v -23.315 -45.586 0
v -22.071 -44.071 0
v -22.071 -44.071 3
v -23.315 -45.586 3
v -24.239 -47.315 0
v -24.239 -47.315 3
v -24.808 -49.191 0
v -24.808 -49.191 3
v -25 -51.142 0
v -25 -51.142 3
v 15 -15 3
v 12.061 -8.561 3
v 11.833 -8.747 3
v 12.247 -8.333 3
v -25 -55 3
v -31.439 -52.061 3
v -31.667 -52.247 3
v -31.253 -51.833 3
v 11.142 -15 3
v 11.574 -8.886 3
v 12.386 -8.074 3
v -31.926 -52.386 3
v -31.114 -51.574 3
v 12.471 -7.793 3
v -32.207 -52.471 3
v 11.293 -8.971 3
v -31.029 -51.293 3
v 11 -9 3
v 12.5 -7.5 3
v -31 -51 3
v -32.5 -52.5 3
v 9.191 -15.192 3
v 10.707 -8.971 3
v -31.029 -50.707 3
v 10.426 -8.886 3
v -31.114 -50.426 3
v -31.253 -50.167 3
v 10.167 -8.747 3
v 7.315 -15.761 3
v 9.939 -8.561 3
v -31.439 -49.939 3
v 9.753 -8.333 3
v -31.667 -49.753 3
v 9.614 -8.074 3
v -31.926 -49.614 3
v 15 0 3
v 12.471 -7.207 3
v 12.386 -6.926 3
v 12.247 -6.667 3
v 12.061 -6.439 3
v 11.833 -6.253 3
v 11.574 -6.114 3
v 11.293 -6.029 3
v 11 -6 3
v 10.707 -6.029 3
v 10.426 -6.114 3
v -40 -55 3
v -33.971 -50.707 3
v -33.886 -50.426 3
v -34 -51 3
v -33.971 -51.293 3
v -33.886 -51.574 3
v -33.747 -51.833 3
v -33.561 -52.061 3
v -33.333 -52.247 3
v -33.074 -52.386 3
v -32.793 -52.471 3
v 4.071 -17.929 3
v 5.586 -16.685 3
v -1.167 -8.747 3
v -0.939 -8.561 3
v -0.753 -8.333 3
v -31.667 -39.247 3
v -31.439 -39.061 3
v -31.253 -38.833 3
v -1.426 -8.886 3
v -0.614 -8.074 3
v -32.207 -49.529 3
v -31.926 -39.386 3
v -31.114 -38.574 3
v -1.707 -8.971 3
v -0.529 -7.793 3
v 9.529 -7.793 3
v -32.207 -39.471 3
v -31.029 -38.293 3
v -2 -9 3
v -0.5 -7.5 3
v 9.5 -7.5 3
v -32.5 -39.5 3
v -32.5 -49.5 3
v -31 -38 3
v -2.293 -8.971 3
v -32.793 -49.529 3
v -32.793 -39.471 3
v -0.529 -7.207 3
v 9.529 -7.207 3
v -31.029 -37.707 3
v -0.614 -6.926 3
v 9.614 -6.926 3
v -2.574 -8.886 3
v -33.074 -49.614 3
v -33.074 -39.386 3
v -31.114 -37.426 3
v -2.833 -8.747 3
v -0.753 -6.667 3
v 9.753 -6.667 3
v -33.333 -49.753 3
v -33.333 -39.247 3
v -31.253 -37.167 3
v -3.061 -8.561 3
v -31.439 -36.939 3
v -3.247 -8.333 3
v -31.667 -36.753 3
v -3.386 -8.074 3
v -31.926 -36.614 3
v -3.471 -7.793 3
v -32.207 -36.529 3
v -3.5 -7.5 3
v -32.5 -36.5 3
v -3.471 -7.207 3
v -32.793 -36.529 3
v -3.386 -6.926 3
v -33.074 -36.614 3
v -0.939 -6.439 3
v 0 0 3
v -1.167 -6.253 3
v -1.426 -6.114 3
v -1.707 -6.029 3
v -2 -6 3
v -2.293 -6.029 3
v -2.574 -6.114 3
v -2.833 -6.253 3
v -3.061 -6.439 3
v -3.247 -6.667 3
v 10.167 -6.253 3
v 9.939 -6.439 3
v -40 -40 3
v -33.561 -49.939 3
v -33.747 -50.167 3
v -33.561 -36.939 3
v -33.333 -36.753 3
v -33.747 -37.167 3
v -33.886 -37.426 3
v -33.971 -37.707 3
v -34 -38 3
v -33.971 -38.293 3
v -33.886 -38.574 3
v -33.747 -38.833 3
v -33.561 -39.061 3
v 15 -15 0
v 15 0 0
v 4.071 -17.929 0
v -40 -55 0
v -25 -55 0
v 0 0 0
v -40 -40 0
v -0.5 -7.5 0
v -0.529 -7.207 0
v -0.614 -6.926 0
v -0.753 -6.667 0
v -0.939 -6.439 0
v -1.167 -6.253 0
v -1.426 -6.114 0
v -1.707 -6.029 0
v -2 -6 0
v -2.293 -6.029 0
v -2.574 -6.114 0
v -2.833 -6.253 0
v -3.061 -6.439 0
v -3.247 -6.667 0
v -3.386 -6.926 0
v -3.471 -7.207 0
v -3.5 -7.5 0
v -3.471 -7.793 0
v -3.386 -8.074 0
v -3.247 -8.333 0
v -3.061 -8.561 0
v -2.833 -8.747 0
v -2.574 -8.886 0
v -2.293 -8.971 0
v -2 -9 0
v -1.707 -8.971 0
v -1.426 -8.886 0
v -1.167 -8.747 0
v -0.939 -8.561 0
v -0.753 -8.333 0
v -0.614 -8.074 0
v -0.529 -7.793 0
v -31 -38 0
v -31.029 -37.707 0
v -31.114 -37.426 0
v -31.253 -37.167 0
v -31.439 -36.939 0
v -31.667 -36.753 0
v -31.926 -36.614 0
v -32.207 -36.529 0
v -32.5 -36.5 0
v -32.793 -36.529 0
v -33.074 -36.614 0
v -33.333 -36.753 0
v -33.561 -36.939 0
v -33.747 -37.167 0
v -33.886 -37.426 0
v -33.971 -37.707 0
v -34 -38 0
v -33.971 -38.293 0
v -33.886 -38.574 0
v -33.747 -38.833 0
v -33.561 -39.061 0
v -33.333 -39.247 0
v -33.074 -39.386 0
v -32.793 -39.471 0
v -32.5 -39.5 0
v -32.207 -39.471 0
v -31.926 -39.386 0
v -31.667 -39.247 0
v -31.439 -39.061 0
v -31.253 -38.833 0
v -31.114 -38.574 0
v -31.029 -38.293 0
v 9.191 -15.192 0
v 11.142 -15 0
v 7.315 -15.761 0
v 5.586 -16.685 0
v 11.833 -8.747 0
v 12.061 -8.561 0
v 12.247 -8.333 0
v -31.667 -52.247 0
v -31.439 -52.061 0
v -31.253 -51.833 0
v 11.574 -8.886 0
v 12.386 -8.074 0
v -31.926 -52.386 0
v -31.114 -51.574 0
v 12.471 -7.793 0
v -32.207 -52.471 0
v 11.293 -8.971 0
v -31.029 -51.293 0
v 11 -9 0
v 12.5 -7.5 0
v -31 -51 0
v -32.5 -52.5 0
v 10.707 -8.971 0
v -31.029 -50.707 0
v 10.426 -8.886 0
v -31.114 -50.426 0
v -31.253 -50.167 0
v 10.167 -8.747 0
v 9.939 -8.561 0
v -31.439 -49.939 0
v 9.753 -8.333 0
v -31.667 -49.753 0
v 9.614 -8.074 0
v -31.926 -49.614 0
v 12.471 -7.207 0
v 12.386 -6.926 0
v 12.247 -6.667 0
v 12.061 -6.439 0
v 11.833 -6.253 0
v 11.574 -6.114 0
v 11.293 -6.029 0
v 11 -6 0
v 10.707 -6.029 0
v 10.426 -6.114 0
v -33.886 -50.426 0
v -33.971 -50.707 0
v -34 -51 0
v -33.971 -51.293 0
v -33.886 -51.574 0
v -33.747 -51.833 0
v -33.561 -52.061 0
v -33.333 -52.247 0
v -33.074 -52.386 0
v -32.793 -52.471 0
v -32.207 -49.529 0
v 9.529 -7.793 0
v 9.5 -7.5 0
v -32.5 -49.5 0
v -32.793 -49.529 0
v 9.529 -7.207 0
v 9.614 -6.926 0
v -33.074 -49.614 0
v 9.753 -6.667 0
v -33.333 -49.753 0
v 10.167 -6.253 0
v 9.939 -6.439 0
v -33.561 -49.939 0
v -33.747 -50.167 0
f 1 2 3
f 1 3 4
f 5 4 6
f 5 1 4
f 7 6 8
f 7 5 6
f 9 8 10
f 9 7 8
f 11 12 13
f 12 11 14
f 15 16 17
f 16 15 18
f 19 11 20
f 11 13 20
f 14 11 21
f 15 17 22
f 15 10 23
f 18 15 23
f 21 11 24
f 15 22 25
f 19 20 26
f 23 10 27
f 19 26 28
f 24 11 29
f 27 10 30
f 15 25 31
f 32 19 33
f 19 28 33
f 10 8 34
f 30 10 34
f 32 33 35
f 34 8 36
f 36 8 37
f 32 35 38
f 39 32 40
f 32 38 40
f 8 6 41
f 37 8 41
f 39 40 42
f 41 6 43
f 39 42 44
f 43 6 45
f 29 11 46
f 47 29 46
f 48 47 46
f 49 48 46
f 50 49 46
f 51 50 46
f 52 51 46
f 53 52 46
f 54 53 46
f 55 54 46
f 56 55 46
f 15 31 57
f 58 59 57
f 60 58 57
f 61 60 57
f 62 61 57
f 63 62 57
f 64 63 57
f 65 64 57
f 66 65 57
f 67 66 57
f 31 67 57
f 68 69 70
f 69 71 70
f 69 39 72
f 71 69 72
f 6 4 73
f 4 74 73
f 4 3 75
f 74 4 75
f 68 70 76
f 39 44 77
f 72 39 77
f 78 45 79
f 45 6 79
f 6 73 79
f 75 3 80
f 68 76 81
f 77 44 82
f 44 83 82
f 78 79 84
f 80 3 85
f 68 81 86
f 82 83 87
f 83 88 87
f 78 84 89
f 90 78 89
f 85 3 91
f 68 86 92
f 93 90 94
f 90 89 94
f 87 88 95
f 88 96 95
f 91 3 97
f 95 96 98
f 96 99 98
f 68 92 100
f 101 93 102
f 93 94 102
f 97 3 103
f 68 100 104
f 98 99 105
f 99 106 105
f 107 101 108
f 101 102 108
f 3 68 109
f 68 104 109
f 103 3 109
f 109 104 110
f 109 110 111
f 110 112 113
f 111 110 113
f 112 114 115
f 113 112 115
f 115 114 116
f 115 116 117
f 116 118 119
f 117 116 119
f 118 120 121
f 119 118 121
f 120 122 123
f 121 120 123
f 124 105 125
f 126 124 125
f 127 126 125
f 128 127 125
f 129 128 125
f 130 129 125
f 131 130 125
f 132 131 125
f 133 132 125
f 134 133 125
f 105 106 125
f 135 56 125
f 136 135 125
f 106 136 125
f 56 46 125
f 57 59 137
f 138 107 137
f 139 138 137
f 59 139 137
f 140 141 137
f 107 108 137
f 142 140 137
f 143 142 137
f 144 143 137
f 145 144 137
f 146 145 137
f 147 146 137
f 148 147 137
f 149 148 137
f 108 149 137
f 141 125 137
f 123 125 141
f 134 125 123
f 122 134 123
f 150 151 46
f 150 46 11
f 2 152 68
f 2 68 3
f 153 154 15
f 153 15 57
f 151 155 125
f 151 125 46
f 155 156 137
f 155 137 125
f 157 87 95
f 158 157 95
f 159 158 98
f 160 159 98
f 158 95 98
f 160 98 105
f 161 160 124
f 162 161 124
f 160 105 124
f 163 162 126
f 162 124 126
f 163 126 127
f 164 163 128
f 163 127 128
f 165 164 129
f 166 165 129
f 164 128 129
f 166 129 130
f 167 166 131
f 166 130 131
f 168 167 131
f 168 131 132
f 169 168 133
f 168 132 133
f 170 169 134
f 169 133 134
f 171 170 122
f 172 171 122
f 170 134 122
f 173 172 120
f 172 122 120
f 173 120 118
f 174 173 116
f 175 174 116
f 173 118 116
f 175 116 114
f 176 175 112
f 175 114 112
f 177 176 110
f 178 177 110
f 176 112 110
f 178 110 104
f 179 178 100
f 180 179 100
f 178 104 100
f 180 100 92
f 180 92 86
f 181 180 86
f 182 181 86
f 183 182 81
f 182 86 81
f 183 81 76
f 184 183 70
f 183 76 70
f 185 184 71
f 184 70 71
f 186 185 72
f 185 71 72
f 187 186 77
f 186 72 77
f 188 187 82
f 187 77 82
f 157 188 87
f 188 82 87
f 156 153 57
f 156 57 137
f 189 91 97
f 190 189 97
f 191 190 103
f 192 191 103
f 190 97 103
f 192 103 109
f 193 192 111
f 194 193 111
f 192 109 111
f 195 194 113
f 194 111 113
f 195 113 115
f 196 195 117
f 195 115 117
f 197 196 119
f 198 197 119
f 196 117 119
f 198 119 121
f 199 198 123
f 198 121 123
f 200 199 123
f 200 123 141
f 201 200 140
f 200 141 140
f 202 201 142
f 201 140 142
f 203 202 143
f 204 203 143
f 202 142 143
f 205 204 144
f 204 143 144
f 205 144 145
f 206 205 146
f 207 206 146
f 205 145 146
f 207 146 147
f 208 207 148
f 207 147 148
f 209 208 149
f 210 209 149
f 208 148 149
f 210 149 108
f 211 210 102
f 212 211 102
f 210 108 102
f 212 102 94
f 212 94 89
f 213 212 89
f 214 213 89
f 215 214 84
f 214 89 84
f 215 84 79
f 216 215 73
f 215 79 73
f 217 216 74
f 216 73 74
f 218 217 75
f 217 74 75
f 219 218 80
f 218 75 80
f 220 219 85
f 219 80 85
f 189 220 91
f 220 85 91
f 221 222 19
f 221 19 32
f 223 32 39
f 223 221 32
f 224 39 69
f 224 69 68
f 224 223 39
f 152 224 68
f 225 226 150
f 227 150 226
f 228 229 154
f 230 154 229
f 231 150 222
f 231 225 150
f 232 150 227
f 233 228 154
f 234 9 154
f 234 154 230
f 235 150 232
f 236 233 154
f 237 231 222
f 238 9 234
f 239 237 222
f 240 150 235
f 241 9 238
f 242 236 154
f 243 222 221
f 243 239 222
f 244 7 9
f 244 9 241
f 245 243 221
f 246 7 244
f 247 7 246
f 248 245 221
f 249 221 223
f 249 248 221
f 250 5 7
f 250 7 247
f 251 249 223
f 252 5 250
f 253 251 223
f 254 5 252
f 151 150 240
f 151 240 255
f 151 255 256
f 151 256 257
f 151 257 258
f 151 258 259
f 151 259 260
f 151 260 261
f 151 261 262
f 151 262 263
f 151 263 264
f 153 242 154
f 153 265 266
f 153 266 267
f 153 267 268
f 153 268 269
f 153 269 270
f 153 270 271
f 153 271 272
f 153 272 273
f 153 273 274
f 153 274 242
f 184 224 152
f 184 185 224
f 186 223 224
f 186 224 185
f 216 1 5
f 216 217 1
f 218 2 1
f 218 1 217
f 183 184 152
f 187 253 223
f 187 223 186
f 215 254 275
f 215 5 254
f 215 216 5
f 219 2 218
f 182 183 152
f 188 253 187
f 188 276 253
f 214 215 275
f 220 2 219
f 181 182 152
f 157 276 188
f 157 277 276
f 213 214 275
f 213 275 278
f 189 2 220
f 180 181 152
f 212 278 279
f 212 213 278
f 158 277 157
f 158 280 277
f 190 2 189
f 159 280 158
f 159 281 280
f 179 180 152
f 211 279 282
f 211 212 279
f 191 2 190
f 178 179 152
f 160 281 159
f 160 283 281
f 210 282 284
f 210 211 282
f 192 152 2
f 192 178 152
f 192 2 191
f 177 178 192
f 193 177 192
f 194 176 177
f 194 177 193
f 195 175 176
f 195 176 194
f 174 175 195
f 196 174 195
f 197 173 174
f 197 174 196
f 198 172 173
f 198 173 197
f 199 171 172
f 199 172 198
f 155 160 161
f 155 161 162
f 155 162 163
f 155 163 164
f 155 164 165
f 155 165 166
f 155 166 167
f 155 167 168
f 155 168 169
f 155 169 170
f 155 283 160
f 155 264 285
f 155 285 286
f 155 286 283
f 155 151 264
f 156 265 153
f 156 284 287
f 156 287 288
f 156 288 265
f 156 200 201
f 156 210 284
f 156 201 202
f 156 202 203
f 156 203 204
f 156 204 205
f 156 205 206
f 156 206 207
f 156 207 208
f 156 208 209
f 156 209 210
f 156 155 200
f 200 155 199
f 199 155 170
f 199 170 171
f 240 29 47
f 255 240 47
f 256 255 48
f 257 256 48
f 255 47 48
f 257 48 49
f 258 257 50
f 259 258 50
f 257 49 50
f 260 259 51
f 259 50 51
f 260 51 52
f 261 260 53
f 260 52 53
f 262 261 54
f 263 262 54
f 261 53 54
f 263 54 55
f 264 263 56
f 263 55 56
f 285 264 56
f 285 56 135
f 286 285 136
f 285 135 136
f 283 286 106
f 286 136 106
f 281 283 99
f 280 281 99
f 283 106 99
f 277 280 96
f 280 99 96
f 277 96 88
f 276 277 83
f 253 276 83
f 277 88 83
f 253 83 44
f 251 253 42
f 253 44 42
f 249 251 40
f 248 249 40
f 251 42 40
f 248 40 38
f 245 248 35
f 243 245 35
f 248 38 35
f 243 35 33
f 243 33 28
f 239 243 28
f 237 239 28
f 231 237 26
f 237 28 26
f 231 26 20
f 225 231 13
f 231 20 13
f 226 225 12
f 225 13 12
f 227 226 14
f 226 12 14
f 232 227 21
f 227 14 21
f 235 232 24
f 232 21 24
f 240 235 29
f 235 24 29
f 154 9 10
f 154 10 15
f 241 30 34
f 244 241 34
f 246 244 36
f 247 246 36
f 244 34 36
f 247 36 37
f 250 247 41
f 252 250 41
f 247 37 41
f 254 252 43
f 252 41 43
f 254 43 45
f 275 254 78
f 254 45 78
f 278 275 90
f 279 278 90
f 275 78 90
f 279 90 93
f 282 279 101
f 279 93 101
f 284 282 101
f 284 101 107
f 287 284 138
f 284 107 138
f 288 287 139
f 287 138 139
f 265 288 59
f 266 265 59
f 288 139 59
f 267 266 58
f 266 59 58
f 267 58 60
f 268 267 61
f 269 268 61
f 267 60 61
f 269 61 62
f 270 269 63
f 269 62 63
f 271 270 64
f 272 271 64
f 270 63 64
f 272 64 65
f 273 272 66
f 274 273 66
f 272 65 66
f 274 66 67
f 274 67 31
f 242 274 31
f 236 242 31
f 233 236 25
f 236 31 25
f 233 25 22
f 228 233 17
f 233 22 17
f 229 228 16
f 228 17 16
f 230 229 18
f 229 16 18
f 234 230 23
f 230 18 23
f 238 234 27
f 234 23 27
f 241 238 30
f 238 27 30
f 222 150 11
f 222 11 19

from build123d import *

# Parameters (mm, degrees)
EXTRUDE_1_DEPTH     = 3
SKETCH_2_R          = 1.5
CUT_EXTRUDE_1_DEPTH = 3


with BuildPart() as part:
    # 草图1 → 凸台-拉伸1 (new body)
    with BuildSketch(Plane.XY):
        with BuildLine():
            Line((0, 0), (15, 0))
            Line((15, 0), (15, -15))
            Line((15, -15), (11.142135624, -15))
            ThreePointArc((11.142135624, -15), (7.3153013, -15.761204675), (4.071067812, -17.928932188))
            Line((4.071067812, -17.928932188), (-22.071067812, -44.071067812))
            ThreePointArc((-22.071067812, -44.071067812), (-24.238795325, -47.3153013), (-25, -51.142135624))
            Line((-25, -51.142135624), (-25, -55))
            Line((-25, -55), (-40, -55))
            Line((-40, -55), (-40, -40))
            Line((-40, -40), (0, 0))
        make_face()
    extrude(amount=EXTRUDE_1_DEPTH)

    # 草图2 → 切除-拉伸1 (cut)
    with BuildSketch(Plane.XY.offset(3)):
        with Locations((11, -7.5)):
            Circle(SKETCH_2_R)
        with Locations((-2, -7.5)):
            Circle(SKETCH_2_R)
        with Locations((-32.5, -51)):
            Circle(SKETCH_2_R)
        with Locations((-32.5, -38)):
            Circle(SKETCH_2_R)
    extrude(amount=-CUT_EXTRUDE_1_DEPTH, mode=Mode.SUBTRACT)


solid = part.part
